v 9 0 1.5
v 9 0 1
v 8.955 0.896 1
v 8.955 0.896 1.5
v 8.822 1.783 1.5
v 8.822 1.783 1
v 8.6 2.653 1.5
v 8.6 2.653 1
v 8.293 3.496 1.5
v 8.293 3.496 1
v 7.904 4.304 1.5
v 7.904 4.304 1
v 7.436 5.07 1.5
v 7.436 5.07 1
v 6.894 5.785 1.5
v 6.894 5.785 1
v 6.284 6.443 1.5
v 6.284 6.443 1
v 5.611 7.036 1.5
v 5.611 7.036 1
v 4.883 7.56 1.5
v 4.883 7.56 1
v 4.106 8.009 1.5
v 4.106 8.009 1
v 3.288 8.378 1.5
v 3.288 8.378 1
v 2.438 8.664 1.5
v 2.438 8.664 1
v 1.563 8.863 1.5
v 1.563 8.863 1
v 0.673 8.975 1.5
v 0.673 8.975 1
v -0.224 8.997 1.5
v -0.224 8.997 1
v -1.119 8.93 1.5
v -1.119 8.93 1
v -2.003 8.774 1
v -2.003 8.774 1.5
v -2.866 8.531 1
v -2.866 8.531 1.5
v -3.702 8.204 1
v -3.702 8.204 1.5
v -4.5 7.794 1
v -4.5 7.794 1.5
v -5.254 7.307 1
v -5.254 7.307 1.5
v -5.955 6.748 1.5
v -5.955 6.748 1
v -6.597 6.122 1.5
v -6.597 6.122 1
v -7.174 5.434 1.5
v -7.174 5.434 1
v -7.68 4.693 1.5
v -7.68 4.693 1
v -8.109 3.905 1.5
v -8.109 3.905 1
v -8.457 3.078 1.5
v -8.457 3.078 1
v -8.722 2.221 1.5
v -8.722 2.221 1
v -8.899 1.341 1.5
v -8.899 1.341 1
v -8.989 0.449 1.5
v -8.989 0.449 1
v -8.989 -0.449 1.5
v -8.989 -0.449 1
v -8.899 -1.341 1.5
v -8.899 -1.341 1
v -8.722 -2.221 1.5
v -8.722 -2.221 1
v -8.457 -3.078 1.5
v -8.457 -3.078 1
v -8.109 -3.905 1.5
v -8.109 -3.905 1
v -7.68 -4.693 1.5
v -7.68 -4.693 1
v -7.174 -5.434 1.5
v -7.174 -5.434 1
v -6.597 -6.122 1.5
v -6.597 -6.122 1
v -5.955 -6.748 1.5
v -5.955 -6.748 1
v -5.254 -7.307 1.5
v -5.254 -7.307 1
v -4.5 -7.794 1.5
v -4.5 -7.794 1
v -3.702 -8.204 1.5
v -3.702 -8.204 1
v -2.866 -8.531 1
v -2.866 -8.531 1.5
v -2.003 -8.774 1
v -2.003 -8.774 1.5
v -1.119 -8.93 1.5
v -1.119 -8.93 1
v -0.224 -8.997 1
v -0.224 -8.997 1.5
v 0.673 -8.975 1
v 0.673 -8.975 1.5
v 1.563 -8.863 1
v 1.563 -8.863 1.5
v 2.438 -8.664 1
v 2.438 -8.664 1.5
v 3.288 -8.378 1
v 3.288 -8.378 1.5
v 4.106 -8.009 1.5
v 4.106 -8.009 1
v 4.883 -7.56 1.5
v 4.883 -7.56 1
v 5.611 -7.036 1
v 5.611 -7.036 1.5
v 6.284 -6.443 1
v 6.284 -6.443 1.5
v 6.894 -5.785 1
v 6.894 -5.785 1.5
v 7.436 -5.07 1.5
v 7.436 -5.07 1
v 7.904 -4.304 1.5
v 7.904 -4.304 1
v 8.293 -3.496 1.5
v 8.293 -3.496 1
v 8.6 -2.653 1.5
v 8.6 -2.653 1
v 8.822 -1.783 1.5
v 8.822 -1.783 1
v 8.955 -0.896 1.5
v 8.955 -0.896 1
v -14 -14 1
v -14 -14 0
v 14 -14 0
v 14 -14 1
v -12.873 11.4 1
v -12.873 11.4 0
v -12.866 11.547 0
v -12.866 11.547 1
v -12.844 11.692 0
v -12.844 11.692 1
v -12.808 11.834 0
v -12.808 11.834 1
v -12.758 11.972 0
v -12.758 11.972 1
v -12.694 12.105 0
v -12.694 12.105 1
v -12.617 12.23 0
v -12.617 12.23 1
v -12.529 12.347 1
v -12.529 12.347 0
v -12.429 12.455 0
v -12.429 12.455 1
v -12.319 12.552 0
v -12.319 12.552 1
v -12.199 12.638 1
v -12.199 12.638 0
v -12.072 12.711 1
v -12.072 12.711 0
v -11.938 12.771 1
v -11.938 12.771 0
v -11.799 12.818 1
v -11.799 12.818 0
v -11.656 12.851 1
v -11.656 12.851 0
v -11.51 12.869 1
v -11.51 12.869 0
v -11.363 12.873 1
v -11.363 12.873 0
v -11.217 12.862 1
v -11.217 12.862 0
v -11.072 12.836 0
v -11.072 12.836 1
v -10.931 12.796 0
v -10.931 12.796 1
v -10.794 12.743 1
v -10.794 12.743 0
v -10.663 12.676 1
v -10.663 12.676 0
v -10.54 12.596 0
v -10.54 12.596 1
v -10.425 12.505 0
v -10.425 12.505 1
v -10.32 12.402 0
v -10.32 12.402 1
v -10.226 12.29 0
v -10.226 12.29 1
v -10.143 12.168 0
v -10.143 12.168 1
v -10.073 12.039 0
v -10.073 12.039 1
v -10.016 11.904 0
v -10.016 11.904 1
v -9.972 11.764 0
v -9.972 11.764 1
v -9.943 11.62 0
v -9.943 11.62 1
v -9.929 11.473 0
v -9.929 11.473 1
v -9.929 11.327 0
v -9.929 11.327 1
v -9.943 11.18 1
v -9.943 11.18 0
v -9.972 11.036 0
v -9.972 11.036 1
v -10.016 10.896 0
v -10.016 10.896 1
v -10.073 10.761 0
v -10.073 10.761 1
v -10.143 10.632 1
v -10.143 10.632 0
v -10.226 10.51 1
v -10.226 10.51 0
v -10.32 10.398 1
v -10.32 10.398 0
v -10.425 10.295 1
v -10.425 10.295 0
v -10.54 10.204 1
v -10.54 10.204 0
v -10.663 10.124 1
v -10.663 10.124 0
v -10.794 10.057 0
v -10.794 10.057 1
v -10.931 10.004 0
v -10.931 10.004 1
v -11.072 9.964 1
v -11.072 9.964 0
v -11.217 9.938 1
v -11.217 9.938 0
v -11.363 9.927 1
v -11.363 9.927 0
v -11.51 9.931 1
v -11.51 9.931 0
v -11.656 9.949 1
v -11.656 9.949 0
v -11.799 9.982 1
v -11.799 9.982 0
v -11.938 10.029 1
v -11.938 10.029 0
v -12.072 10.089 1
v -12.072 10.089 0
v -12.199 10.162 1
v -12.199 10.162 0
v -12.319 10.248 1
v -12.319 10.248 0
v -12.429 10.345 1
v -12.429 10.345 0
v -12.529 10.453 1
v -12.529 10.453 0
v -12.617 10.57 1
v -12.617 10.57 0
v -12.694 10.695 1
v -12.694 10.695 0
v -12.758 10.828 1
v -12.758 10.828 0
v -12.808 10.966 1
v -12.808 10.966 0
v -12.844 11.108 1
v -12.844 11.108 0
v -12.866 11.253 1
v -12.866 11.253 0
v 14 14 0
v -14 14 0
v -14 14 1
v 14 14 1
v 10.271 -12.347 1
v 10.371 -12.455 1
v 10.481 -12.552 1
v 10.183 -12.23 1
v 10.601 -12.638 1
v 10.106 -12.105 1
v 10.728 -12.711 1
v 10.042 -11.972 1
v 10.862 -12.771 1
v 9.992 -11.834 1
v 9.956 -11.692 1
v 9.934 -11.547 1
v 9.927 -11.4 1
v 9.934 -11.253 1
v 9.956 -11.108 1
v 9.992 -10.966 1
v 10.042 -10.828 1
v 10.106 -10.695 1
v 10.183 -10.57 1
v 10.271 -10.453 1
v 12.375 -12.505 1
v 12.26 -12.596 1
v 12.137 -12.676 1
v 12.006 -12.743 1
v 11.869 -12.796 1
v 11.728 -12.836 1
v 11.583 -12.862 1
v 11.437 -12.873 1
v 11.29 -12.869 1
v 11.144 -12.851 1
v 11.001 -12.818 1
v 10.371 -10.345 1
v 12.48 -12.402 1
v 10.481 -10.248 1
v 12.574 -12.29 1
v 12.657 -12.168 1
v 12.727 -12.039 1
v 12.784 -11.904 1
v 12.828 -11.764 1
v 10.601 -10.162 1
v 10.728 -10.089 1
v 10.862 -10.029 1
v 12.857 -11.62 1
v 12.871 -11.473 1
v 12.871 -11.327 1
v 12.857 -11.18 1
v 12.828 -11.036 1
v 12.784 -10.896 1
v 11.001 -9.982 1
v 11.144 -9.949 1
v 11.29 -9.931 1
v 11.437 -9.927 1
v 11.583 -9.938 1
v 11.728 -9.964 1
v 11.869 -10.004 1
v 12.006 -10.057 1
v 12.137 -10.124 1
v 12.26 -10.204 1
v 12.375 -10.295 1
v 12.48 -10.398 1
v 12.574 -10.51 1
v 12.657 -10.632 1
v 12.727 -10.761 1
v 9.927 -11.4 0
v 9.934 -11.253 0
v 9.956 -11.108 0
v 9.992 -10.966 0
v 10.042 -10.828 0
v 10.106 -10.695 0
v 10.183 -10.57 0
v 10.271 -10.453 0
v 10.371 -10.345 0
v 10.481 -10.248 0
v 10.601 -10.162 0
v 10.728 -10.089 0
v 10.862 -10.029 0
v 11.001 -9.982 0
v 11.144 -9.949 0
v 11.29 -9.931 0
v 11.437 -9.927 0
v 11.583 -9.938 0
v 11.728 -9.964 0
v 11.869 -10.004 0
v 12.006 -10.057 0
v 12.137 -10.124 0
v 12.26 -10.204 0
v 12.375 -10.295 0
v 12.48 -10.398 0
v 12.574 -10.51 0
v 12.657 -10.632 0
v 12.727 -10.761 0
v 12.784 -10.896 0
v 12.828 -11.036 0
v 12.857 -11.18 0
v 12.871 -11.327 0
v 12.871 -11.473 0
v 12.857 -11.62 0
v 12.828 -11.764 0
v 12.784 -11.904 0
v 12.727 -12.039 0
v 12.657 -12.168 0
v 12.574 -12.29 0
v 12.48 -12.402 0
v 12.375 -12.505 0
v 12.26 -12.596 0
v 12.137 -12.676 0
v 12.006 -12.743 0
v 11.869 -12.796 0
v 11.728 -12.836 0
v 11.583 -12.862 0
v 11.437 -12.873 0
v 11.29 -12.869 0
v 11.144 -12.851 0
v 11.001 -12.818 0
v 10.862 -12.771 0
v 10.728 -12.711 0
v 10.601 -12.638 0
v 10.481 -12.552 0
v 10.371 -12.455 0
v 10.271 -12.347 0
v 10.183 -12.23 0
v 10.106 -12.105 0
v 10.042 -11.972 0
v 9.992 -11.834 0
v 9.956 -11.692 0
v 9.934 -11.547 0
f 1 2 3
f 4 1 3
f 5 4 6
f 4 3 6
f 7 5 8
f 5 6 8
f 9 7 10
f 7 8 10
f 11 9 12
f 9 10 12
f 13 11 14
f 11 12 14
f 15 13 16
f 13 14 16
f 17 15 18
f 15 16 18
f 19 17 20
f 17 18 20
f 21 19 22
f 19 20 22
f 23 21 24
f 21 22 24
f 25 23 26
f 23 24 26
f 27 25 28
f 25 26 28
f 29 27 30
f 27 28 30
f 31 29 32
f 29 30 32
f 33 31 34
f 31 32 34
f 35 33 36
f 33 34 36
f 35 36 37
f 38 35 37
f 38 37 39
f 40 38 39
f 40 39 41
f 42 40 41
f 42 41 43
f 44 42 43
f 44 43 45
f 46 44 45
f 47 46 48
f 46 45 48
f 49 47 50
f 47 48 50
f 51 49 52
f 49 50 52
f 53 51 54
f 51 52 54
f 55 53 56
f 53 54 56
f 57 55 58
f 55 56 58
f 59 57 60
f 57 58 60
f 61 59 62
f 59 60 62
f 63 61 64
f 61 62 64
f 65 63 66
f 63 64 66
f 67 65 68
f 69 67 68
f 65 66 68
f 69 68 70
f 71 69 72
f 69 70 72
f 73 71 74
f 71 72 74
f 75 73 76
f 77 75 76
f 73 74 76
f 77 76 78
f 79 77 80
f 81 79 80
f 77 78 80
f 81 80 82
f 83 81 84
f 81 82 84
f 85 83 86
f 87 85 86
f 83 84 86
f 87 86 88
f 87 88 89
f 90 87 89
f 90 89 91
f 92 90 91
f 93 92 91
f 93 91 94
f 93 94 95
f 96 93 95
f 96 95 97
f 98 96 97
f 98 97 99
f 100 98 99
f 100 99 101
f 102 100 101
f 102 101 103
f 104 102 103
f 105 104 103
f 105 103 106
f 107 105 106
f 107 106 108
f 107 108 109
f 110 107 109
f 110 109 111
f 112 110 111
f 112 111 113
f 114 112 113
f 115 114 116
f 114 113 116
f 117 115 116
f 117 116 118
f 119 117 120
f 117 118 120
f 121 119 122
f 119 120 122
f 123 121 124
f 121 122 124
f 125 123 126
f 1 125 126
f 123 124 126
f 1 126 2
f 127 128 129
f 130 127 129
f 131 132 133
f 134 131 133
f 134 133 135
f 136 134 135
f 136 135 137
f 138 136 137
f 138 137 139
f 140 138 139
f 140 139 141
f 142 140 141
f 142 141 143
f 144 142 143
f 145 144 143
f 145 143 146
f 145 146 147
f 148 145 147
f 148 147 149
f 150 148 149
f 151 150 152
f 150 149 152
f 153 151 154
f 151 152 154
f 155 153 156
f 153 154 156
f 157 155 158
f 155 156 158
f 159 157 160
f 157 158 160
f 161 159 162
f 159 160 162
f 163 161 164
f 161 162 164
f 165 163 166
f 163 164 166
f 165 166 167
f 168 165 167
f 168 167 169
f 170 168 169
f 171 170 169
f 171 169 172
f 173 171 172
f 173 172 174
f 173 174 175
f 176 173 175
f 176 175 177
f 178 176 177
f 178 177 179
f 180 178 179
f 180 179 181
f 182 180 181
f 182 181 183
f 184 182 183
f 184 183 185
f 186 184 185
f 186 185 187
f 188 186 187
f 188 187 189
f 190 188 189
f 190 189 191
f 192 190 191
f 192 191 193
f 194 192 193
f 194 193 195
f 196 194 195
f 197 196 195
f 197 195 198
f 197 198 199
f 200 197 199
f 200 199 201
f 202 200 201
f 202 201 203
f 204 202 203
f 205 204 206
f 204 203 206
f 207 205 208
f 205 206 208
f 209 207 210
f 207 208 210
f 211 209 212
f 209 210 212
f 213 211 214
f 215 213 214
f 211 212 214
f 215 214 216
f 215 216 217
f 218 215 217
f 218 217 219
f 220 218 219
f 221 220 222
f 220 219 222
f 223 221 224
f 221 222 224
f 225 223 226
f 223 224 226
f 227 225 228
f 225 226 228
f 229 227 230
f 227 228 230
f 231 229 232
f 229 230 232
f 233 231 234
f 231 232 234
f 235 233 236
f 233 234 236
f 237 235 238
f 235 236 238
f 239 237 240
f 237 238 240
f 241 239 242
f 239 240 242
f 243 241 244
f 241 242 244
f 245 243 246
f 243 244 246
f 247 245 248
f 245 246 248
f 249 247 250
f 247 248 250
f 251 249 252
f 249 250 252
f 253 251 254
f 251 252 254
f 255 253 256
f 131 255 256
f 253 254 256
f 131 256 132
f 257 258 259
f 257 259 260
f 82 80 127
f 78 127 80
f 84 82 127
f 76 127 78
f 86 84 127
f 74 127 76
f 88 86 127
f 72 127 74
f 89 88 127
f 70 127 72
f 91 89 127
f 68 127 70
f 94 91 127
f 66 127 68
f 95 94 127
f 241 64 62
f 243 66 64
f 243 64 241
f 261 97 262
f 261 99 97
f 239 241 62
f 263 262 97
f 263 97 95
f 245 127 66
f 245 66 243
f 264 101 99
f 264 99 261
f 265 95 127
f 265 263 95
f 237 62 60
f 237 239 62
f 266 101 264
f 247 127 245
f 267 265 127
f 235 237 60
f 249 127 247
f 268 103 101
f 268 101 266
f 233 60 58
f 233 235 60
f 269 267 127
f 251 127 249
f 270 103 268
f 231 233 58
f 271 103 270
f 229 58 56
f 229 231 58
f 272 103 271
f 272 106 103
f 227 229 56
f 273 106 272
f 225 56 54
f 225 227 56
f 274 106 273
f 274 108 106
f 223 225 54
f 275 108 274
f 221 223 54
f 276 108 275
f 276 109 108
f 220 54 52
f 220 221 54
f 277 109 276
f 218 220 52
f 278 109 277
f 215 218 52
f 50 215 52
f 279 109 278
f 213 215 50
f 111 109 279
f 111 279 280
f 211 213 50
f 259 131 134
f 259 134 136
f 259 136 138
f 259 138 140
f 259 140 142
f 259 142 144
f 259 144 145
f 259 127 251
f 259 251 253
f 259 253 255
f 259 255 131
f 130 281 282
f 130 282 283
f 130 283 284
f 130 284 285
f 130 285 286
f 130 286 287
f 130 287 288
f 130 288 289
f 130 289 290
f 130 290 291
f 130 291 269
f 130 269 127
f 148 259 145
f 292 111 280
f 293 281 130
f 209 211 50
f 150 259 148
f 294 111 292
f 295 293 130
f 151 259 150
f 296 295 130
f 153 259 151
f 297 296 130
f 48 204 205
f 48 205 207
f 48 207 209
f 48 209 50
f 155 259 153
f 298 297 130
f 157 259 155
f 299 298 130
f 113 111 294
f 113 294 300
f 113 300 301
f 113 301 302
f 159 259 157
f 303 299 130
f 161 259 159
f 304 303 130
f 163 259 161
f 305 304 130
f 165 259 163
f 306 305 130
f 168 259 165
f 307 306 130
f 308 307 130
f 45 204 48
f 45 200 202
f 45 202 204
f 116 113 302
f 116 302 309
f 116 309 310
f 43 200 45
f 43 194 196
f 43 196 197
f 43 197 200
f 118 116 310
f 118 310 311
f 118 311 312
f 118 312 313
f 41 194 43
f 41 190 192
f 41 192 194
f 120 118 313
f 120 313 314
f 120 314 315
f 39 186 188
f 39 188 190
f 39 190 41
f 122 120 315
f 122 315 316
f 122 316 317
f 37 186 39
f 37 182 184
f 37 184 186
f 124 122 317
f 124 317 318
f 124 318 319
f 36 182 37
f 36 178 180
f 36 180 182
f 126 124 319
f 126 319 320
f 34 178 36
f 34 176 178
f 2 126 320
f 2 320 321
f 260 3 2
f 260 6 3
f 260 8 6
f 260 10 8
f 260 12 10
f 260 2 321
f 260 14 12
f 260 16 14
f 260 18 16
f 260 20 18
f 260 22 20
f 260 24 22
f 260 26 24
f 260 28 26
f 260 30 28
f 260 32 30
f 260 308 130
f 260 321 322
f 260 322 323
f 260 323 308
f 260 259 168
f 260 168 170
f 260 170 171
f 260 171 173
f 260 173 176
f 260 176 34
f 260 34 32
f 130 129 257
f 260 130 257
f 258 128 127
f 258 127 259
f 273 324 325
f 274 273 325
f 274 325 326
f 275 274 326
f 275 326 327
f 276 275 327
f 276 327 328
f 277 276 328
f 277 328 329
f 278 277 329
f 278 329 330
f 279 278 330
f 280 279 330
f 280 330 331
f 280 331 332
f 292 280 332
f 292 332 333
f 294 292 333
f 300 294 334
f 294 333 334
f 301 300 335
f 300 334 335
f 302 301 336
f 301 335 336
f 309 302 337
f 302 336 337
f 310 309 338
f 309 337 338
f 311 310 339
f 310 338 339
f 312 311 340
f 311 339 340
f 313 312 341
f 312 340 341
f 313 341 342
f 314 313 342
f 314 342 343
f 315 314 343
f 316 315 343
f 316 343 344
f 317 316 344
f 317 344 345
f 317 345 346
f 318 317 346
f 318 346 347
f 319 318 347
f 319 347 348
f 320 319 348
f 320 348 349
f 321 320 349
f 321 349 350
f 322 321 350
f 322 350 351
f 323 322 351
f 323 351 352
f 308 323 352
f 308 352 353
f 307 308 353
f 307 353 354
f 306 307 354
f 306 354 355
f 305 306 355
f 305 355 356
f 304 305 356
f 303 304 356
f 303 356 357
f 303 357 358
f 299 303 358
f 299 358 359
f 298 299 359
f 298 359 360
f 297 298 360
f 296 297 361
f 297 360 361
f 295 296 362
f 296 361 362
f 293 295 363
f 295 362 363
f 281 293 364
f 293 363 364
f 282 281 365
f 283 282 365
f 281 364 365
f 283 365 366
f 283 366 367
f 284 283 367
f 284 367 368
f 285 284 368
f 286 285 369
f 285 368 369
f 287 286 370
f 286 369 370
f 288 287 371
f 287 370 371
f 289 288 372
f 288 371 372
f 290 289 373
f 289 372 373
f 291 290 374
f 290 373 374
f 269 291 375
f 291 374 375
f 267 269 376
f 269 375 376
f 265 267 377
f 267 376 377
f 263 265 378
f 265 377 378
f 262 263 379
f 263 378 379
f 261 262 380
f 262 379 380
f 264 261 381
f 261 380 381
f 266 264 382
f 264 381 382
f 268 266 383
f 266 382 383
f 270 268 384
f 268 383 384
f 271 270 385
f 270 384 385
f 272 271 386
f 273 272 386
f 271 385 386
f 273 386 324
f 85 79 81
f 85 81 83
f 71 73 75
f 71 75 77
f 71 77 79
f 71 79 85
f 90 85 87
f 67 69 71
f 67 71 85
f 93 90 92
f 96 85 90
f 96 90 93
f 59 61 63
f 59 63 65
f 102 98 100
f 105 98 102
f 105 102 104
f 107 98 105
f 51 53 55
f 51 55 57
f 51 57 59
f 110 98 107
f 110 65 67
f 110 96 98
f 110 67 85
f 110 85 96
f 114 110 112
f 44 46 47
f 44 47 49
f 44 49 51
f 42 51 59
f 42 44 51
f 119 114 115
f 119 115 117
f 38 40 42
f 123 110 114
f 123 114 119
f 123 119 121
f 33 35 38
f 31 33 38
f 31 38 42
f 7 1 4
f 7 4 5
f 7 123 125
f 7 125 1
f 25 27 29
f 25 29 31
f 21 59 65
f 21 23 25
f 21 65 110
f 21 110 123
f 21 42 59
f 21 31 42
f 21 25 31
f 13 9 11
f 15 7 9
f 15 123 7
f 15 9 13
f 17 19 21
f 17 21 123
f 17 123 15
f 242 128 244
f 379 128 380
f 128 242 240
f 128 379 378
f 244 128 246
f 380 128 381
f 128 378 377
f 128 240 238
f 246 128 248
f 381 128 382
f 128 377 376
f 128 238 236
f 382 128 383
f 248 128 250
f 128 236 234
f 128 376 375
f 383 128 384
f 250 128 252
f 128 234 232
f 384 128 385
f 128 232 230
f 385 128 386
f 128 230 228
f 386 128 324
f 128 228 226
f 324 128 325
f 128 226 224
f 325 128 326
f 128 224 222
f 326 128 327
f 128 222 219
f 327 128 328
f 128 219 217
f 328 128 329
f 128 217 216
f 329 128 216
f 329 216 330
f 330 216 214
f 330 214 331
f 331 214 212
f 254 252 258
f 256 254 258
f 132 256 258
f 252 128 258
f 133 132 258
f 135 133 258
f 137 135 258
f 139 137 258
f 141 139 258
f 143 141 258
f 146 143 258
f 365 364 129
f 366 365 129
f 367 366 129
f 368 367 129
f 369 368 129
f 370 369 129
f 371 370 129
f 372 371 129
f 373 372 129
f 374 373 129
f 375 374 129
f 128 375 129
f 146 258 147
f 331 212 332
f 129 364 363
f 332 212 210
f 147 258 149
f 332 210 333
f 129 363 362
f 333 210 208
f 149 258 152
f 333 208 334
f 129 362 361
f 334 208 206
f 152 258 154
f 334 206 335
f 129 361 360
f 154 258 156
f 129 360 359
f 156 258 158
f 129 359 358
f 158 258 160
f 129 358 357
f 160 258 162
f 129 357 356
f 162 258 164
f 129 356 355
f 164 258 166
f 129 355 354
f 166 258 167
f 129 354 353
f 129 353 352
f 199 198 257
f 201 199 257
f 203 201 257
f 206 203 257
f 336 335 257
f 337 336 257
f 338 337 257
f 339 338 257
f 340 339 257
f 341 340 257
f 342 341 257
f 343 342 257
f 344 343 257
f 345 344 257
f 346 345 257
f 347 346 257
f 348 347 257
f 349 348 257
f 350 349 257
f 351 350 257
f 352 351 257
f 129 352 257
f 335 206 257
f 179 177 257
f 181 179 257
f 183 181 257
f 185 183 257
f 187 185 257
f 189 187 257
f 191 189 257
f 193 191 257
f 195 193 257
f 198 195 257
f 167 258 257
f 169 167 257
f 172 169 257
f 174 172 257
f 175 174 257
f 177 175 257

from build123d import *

# Parameters (mm, degrees)
SKETCH1_W             = 28
SKETCH1_H             = 28
BOSS_EXTRUDE1_DEPTH   = 1
SKETCH2_R             = 9
BOSS_EXTRUDE2_DEPTH   = 0.5
F_4_CLEARANCE_HOLE1_D = 2.9464


with BuildPart() as part:
    # Sketch1 → Boss-Extrude1 (new body)
    with BuildSketch(Plane.XY):
        Rectangle(SKETCH1_W, SKETCH1_H)
    extrude(amount=BOSS_EXTRUDE1_DEPTH)

    # Sketch2 → Boss-Extrude2 (add)
    with BuildSketch(Plane.XY.offset(1)):
        Circle(SKETCH2_R)
    extrude(amount=BOSS_EXTRUDE2_DEPTH)

    # #4 Clearance Hole1 (through all)
    with Locations(Plane.XY.offset(1)):
        with Locations((11.4, -11.4), (-11.4, 11.4)):
            Hole(F_4_CLEARANCE_HOLE1_D / 2)


solid = part.part
